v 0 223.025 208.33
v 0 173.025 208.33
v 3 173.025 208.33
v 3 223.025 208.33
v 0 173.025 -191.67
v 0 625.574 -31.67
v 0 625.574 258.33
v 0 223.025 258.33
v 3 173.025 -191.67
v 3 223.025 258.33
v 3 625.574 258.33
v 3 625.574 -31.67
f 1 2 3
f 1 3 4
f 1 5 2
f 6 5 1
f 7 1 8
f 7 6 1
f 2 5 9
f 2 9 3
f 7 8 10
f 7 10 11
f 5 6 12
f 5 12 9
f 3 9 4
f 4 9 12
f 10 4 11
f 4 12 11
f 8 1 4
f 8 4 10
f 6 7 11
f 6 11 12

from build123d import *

# Parameters (mm, degrees)
BOSS_EXTRUDE1_DEPTH = 3
SKETCH2_W           = 50
SKETCH2_H           = 50
CUT_EXTRUDE1_DEPTH  = 10


with BuildPart() as part:
    # Sketch1 → Boss-Extrude1 (new body)
    with BuildSketch(Plane(origin=(0, 0, 0), x_dir=(0, 0, -1), z_dir=(1, 0, 0))):
        Polygon((31.669668796, 625.573683549), (191.669668796, 173.025343589), (-258.330331204, 173.025343589), (-258.330331204, 625.573683549), align=None)
    extrude(amount=BOSS_EXTRUDE1_DEPTH)

    # Sketch2 → Cut-Extrude1 (cut)
    with BuildSketch(Plane.ZY):
        with Locations((233.330331204, 198.025343589)):
            Rectangle(SKETCH2_W, SKETCH2_H)
    extrude(amount=-CUT_EXTRUDE1_DEPTH, mode=Mode.SUBTRACT)


solid = part.part
